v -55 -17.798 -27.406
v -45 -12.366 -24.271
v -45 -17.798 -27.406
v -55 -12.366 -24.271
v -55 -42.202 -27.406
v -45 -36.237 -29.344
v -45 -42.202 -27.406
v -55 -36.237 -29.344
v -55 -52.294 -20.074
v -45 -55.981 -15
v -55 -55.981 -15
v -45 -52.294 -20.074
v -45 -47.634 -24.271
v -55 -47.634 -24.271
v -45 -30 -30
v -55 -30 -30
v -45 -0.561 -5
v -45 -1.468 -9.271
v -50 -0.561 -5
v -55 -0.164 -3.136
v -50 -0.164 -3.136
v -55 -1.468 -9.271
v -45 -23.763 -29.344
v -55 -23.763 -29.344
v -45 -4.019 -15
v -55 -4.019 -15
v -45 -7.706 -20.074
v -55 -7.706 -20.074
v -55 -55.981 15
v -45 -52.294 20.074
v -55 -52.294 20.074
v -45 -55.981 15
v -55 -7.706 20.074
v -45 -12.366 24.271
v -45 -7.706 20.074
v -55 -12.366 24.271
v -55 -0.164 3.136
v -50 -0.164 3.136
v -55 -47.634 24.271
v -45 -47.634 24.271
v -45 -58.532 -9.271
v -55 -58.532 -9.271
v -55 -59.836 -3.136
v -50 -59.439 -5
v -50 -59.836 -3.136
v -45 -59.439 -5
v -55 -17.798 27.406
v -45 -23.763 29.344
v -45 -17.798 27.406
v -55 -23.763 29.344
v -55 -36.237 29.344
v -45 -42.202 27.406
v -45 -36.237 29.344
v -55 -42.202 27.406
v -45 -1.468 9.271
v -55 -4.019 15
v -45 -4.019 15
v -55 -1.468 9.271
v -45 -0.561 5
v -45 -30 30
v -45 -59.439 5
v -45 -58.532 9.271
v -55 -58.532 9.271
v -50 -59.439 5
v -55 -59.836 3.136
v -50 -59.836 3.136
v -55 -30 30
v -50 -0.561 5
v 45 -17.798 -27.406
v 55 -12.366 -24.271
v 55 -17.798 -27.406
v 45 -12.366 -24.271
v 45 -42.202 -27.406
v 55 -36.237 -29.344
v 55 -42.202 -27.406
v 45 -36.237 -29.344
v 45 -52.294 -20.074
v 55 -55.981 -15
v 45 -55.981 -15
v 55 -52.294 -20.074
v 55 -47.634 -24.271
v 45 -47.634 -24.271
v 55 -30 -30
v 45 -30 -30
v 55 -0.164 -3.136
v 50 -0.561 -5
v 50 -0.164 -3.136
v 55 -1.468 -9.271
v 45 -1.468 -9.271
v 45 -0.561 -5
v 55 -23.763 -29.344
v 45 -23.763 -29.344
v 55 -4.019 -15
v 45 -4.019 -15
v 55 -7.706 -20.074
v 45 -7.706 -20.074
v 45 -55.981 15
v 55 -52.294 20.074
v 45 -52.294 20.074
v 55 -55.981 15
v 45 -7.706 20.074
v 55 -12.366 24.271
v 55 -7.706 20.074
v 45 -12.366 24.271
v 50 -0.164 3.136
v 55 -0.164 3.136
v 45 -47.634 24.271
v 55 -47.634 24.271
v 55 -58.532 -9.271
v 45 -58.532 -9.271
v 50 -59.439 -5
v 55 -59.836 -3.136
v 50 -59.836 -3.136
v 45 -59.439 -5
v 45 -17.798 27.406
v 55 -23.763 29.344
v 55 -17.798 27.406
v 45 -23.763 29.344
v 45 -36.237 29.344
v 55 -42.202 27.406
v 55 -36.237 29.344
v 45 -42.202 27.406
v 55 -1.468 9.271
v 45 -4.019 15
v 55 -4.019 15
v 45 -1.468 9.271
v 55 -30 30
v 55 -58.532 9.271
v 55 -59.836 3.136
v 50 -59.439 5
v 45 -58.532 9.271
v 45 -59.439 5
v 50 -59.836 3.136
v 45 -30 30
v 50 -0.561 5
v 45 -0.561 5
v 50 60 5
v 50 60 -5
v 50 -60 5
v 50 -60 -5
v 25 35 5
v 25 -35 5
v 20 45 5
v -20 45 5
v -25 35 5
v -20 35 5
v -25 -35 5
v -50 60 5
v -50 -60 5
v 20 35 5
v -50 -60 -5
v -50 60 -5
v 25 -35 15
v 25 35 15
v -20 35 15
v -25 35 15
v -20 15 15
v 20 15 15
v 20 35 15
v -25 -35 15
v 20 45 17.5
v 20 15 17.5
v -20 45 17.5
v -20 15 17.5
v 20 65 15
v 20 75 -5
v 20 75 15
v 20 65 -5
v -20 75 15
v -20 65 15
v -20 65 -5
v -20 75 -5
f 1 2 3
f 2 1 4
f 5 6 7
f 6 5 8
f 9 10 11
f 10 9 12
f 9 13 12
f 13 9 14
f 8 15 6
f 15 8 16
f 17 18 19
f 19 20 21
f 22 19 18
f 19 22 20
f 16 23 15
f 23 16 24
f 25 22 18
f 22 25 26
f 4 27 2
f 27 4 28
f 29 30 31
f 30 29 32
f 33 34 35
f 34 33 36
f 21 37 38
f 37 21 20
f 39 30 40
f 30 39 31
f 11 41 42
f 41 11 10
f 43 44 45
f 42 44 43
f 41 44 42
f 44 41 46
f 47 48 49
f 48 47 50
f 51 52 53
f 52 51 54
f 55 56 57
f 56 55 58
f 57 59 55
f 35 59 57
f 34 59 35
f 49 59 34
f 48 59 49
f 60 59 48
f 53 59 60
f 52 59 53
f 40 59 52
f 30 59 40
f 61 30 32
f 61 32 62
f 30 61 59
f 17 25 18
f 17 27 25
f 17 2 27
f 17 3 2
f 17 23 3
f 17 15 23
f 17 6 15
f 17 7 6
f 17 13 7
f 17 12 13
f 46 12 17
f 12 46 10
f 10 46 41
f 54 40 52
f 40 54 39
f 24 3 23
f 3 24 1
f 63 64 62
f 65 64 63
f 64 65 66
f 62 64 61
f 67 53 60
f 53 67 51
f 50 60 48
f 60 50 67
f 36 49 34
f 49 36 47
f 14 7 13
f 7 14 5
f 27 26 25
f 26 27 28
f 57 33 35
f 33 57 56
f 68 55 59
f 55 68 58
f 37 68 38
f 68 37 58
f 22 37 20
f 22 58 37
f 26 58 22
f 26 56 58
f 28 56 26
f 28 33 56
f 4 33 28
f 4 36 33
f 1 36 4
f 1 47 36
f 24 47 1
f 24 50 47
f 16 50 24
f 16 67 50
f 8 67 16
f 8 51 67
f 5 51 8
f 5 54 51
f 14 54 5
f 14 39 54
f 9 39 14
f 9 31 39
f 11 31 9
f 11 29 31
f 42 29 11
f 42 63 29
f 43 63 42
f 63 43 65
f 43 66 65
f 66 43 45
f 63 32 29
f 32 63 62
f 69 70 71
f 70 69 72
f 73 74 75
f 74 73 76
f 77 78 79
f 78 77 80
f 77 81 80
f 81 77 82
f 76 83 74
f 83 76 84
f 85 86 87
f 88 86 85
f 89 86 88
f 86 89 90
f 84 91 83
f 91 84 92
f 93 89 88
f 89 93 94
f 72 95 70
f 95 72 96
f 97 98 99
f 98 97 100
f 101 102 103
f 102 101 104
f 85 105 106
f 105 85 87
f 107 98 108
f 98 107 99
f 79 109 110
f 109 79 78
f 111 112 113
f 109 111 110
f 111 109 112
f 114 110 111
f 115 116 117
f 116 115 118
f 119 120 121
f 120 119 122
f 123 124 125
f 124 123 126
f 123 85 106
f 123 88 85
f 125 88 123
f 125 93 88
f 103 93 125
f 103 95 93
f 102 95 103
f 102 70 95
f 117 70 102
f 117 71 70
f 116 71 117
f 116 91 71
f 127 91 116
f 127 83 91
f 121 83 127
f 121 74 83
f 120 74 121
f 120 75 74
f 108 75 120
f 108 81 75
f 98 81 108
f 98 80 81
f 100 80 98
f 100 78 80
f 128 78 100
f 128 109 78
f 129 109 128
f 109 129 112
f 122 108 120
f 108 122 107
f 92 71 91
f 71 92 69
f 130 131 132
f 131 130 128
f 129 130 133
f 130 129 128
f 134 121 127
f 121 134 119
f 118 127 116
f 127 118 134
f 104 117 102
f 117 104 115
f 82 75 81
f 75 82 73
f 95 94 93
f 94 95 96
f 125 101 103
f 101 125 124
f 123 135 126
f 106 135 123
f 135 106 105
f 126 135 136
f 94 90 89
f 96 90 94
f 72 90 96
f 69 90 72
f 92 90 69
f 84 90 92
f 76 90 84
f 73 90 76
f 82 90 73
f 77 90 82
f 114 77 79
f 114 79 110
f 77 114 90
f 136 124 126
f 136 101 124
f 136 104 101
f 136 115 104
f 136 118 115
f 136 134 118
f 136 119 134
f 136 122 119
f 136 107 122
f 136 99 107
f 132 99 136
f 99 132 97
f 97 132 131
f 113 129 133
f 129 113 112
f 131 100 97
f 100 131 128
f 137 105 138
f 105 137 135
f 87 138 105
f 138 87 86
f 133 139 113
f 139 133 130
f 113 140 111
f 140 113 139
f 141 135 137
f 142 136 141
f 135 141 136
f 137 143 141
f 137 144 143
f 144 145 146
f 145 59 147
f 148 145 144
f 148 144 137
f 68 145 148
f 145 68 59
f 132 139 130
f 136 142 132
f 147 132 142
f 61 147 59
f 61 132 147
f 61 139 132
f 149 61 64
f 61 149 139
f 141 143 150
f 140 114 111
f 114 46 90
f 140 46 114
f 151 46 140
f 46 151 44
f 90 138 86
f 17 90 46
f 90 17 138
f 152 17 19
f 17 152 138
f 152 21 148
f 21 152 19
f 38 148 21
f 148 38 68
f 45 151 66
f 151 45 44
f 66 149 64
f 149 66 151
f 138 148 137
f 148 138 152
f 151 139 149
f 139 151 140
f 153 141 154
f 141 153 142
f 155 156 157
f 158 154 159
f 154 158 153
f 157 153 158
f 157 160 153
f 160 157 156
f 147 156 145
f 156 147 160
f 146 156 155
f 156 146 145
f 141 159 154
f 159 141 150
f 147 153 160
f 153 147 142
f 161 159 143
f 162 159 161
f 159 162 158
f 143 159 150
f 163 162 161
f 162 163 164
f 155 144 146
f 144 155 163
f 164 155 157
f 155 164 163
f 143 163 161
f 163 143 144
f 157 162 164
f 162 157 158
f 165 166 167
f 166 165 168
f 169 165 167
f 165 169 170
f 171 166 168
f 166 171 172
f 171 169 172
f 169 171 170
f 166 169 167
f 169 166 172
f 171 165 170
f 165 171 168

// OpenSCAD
// Robot dimensions
chassis_w = 100;
chassis_l = 120;
chassis_h = 10;

wheel_r = 30;
wheel_w = 10;

sensor_size = 20;

// Chassis
color("gray") cube([chassis_w, chassis_l, chassis_h], center=true);

// Wheels
color("black") {
    translate([-chassis_w/2 - wheel_w/2, -chassis_l/4, 0]) rotate([0, 90, 0]) cylinder(r=wheel_r, h=wheel_w);
    translate([chassis_w/2 - wheel_w/2, -chassis_l/4, 0]) rotate([0, 90, 0]) cylinder(r=wheel_r, h=wheel_w);
}

// Controller (Arduino)
color("blue") translate([0, 0, chassis_h/2 + 5]) cube([50, 70, 10], center=true);

// Battery
color("green") translate([0, 30, chassis_h/2 + 5]) cube([40, 30, 15], center=true);

// Sensor
color("silver") translate([0, chassis_l/2 + sensor_size/2, chassis_h/2]) cube([sensor_size*2, sensor_size/2, sensor_size], center=true);
